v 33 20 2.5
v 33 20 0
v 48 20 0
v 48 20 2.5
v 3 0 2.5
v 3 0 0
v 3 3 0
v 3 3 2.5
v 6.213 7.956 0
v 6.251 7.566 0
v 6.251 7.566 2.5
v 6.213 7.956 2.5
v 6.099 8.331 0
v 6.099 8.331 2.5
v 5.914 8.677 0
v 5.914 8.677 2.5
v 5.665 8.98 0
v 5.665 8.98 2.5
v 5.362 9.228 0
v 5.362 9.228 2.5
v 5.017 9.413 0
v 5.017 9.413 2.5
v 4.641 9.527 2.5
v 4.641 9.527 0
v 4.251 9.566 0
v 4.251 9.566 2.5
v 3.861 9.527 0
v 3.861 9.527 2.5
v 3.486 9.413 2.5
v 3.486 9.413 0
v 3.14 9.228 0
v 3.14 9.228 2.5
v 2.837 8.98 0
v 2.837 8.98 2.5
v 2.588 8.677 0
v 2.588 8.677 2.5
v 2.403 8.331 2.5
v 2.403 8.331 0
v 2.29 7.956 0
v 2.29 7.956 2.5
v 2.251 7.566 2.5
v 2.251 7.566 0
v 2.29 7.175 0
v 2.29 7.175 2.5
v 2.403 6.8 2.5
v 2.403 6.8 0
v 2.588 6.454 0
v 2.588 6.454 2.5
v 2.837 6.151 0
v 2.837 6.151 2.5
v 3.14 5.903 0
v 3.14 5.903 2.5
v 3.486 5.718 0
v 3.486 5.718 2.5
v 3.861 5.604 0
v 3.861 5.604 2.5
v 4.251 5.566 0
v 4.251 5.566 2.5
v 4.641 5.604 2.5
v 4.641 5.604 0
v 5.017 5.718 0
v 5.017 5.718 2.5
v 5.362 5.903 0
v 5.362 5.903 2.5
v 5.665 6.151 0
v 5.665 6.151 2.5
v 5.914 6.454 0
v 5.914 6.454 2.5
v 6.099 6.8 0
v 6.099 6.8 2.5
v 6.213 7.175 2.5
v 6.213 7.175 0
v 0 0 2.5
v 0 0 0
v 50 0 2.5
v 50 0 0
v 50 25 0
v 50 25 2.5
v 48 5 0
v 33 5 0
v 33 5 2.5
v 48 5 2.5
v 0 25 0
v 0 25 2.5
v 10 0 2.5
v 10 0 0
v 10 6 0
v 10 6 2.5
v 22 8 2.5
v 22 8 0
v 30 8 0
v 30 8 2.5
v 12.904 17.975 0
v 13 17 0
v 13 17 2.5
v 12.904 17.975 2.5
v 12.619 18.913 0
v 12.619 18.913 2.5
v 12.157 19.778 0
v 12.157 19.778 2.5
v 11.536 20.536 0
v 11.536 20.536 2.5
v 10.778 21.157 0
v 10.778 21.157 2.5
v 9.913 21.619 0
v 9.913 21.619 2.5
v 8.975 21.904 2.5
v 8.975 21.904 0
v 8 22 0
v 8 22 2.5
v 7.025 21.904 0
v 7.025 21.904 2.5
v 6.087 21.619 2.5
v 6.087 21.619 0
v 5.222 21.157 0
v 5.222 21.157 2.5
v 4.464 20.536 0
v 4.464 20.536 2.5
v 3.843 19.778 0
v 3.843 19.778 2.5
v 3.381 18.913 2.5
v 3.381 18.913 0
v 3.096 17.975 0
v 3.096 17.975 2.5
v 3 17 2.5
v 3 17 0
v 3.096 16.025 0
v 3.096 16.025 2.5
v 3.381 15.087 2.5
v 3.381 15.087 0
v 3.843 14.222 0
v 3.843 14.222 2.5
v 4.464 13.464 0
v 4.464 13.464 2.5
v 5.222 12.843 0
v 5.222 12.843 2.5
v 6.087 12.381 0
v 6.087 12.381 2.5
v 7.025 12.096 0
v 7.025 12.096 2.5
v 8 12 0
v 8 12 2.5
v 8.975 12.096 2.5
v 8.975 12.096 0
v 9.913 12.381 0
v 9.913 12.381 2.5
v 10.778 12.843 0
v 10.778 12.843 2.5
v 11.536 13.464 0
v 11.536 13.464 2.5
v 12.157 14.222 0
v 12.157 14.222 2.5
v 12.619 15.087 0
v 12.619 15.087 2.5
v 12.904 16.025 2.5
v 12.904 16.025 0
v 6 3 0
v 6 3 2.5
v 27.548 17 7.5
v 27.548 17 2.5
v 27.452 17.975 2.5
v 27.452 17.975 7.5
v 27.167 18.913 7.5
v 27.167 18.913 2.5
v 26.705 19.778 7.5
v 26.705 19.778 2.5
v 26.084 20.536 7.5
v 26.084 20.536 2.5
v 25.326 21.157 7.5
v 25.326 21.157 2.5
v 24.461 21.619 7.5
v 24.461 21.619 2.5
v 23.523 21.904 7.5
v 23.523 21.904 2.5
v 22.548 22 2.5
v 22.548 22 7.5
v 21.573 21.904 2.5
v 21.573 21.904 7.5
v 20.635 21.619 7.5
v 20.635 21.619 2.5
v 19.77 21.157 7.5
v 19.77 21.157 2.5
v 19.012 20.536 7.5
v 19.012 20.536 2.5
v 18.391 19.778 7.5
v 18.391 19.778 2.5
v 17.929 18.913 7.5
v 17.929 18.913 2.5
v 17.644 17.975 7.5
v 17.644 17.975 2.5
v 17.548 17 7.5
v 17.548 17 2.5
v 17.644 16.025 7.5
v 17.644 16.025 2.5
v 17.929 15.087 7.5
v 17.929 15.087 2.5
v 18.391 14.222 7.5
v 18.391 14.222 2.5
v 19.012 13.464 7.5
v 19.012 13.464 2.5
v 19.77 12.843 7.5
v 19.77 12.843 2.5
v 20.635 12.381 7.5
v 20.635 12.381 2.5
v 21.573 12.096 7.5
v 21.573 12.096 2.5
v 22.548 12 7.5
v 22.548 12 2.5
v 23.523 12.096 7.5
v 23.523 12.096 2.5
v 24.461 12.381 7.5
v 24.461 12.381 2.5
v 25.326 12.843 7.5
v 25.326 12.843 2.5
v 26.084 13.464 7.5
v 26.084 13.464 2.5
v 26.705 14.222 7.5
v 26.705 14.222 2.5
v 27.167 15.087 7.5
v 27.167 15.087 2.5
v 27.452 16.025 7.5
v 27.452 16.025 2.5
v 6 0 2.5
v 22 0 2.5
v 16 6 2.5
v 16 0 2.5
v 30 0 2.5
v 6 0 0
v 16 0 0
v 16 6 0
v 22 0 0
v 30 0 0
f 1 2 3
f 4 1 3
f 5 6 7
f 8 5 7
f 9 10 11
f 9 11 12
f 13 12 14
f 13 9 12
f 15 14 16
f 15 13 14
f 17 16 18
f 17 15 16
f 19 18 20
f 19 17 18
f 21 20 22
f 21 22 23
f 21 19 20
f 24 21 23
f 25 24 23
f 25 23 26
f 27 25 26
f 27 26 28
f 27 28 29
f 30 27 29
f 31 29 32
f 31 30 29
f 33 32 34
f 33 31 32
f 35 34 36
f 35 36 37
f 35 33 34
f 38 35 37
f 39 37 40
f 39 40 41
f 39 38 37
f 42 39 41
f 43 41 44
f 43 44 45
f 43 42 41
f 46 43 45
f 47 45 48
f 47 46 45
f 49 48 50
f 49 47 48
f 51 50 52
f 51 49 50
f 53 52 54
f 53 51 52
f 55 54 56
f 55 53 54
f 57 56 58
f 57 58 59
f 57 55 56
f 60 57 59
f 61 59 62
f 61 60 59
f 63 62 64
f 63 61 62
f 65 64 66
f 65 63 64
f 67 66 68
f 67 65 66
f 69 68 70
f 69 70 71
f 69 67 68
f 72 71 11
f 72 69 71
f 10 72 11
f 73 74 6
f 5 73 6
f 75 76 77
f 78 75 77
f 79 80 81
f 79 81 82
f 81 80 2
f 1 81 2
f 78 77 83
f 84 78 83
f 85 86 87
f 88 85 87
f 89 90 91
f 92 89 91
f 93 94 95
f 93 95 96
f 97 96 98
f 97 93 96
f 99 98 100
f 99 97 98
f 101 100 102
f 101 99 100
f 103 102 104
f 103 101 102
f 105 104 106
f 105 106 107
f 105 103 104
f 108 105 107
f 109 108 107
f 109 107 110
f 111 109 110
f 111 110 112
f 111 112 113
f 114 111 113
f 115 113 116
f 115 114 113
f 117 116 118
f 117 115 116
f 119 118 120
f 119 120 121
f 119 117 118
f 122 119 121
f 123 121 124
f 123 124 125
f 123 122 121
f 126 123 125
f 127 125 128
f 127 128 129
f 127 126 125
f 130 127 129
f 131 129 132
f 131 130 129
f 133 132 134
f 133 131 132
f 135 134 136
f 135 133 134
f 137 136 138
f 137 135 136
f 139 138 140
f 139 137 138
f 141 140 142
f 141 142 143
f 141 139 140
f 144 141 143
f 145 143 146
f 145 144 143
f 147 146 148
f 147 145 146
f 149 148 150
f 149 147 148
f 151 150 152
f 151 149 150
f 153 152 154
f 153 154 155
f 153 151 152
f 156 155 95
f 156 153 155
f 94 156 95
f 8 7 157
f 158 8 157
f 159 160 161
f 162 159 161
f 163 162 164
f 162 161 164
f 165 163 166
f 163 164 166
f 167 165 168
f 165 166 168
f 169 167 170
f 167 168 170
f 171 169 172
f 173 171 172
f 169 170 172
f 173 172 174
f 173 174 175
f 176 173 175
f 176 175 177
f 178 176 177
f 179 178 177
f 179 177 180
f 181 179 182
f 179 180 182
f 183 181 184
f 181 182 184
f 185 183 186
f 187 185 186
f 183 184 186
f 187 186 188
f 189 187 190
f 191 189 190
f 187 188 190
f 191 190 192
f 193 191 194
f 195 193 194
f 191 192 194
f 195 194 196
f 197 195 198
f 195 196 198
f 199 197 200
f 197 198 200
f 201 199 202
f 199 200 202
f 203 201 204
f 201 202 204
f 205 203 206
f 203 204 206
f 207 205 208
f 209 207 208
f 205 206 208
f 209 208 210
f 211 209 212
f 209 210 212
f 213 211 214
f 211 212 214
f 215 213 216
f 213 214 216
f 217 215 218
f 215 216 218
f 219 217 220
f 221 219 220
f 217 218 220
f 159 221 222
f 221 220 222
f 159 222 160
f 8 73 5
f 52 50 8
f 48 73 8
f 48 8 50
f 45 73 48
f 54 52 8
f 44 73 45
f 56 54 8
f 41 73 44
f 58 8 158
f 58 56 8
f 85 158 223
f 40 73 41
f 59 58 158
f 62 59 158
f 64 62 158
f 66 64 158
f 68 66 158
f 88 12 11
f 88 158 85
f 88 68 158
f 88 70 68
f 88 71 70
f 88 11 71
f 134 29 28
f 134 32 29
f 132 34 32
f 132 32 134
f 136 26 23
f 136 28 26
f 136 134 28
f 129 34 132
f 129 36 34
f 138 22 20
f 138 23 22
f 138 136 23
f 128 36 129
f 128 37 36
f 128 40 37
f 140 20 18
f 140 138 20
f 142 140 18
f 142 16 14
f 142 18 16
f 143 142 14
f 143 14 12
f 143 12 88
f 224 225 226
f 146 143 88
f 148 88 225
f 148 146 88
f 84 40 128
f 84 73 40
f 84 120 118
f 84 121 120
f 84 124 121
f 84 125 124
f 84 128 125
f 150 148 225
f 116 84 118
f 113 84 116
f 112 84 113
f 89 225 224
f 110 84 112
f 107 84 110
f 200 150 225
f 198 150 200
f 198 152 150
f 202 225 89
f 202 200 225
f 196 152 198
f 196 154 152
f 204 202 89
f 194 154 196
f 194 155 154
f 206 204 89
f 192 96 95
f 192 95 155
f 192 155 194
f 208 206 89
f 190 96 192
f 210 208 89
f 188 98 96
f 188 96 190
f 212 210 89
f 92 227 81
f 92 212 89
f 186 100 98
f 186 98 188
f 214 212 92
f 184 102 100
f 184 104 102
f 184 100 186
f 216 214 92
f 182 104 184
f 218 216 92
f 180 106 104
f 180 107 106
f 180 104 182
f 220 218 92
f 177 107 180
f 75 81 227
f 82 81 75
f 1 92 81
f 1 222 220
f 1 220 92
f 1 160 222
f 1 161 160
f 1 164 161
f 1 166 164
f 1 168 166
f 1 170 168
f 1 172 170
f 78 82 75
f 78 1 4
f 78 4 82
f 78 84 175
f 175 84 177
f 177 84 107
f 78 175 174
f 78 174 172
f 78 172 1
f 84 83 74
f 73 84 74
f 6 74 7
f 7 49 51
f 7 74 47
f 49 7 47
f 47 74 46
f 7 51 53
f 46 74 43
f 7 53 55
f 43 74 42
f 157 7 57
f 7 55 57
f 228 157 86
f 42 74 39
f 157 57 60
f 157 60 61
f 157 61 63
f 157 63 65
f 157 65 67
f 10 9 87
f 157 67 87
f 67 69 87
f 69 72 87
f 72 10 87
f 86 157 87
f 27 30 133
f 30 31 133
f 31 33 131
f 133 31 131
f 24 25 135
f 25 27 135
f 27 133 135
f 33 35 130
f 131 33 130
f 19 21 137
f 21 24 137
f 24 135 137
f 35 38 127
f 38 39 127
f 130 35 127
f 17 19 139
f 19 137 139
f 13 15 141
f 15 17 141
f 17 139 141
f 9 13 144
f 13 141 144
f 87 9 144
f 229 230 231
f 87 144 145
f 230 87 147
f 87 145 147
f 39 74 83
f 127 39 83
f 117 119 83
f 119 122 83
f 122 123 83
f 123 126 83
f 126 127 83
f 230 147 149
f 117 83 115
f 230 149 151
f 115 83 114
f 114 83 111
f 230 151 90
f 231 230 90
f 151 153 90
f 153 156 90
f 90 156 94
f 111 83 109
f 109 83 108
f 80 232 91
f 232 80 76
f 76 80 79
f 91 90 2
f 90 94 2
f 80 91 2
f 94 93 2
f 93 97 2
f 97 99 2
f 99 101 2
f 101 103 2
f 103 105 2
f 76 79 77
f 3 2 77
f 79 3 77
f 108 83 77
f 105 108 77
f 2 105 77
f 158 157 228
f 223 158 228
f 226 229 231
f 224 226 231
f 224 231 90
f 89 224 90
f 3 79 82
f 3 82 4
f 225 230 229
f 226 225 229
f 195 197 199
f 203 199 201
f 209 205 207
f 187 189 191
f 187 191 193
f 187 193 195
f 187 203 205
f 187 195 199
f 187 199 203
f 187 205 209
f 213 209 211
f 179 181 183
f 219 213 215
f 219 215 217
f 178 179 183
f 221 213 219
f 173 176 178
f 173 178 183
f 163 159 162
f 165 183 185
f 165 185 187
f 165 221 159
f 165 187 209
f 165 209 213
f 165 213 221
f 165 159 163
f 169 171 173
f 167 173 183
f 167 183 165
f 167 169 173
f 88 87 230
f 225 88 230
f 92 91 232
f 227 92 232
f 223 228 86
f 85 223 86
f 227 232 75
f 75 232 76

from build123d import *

# Parameters (mm, degrees)
F0_R     = 2
F0_R_2   = 5
F0_W     = 15
F0_H     = 15
F1_DEPTH = 2.5
F2_R     = 5
F3_DEPTH = 5


with BuildPart() as f1:
    # F0 (on Top) → F1 (new body)
    with BuildSketch(Plane.XY):
        Polygon((0, 25), (0, 0), (3, 0), (3, 3), (6, 3), (6, 0), (10, 0), (10, 6), (16, 6), (16, 0), (22, 0), (22, 8), (30, 8), (30, 0), (50, 0), (50, 25), align=None)
        with Locations((4.25116, 7.565503)):
            Circle(F0_R, mode=Mode.SUBTRACT)
        with Locations((8, 17)):
            Circle(F0_R_2, mode=Mode.SUBTRACT)
        with Locations((40.5, 12.5)):
            Rectangle(F0_W, F0_H, mode=Mode.SUBTRACT)
    extrude(amount=F1_DEPTH)

    # F2 (on face) → F3 (join)
    with BuildSketch(Plane.XY.offset(2.5)):
        with Locations((22.548001, 17)):
            Circle(F2_R)
    extrude(amount=F3_DEPTH)


solid = f1.part
